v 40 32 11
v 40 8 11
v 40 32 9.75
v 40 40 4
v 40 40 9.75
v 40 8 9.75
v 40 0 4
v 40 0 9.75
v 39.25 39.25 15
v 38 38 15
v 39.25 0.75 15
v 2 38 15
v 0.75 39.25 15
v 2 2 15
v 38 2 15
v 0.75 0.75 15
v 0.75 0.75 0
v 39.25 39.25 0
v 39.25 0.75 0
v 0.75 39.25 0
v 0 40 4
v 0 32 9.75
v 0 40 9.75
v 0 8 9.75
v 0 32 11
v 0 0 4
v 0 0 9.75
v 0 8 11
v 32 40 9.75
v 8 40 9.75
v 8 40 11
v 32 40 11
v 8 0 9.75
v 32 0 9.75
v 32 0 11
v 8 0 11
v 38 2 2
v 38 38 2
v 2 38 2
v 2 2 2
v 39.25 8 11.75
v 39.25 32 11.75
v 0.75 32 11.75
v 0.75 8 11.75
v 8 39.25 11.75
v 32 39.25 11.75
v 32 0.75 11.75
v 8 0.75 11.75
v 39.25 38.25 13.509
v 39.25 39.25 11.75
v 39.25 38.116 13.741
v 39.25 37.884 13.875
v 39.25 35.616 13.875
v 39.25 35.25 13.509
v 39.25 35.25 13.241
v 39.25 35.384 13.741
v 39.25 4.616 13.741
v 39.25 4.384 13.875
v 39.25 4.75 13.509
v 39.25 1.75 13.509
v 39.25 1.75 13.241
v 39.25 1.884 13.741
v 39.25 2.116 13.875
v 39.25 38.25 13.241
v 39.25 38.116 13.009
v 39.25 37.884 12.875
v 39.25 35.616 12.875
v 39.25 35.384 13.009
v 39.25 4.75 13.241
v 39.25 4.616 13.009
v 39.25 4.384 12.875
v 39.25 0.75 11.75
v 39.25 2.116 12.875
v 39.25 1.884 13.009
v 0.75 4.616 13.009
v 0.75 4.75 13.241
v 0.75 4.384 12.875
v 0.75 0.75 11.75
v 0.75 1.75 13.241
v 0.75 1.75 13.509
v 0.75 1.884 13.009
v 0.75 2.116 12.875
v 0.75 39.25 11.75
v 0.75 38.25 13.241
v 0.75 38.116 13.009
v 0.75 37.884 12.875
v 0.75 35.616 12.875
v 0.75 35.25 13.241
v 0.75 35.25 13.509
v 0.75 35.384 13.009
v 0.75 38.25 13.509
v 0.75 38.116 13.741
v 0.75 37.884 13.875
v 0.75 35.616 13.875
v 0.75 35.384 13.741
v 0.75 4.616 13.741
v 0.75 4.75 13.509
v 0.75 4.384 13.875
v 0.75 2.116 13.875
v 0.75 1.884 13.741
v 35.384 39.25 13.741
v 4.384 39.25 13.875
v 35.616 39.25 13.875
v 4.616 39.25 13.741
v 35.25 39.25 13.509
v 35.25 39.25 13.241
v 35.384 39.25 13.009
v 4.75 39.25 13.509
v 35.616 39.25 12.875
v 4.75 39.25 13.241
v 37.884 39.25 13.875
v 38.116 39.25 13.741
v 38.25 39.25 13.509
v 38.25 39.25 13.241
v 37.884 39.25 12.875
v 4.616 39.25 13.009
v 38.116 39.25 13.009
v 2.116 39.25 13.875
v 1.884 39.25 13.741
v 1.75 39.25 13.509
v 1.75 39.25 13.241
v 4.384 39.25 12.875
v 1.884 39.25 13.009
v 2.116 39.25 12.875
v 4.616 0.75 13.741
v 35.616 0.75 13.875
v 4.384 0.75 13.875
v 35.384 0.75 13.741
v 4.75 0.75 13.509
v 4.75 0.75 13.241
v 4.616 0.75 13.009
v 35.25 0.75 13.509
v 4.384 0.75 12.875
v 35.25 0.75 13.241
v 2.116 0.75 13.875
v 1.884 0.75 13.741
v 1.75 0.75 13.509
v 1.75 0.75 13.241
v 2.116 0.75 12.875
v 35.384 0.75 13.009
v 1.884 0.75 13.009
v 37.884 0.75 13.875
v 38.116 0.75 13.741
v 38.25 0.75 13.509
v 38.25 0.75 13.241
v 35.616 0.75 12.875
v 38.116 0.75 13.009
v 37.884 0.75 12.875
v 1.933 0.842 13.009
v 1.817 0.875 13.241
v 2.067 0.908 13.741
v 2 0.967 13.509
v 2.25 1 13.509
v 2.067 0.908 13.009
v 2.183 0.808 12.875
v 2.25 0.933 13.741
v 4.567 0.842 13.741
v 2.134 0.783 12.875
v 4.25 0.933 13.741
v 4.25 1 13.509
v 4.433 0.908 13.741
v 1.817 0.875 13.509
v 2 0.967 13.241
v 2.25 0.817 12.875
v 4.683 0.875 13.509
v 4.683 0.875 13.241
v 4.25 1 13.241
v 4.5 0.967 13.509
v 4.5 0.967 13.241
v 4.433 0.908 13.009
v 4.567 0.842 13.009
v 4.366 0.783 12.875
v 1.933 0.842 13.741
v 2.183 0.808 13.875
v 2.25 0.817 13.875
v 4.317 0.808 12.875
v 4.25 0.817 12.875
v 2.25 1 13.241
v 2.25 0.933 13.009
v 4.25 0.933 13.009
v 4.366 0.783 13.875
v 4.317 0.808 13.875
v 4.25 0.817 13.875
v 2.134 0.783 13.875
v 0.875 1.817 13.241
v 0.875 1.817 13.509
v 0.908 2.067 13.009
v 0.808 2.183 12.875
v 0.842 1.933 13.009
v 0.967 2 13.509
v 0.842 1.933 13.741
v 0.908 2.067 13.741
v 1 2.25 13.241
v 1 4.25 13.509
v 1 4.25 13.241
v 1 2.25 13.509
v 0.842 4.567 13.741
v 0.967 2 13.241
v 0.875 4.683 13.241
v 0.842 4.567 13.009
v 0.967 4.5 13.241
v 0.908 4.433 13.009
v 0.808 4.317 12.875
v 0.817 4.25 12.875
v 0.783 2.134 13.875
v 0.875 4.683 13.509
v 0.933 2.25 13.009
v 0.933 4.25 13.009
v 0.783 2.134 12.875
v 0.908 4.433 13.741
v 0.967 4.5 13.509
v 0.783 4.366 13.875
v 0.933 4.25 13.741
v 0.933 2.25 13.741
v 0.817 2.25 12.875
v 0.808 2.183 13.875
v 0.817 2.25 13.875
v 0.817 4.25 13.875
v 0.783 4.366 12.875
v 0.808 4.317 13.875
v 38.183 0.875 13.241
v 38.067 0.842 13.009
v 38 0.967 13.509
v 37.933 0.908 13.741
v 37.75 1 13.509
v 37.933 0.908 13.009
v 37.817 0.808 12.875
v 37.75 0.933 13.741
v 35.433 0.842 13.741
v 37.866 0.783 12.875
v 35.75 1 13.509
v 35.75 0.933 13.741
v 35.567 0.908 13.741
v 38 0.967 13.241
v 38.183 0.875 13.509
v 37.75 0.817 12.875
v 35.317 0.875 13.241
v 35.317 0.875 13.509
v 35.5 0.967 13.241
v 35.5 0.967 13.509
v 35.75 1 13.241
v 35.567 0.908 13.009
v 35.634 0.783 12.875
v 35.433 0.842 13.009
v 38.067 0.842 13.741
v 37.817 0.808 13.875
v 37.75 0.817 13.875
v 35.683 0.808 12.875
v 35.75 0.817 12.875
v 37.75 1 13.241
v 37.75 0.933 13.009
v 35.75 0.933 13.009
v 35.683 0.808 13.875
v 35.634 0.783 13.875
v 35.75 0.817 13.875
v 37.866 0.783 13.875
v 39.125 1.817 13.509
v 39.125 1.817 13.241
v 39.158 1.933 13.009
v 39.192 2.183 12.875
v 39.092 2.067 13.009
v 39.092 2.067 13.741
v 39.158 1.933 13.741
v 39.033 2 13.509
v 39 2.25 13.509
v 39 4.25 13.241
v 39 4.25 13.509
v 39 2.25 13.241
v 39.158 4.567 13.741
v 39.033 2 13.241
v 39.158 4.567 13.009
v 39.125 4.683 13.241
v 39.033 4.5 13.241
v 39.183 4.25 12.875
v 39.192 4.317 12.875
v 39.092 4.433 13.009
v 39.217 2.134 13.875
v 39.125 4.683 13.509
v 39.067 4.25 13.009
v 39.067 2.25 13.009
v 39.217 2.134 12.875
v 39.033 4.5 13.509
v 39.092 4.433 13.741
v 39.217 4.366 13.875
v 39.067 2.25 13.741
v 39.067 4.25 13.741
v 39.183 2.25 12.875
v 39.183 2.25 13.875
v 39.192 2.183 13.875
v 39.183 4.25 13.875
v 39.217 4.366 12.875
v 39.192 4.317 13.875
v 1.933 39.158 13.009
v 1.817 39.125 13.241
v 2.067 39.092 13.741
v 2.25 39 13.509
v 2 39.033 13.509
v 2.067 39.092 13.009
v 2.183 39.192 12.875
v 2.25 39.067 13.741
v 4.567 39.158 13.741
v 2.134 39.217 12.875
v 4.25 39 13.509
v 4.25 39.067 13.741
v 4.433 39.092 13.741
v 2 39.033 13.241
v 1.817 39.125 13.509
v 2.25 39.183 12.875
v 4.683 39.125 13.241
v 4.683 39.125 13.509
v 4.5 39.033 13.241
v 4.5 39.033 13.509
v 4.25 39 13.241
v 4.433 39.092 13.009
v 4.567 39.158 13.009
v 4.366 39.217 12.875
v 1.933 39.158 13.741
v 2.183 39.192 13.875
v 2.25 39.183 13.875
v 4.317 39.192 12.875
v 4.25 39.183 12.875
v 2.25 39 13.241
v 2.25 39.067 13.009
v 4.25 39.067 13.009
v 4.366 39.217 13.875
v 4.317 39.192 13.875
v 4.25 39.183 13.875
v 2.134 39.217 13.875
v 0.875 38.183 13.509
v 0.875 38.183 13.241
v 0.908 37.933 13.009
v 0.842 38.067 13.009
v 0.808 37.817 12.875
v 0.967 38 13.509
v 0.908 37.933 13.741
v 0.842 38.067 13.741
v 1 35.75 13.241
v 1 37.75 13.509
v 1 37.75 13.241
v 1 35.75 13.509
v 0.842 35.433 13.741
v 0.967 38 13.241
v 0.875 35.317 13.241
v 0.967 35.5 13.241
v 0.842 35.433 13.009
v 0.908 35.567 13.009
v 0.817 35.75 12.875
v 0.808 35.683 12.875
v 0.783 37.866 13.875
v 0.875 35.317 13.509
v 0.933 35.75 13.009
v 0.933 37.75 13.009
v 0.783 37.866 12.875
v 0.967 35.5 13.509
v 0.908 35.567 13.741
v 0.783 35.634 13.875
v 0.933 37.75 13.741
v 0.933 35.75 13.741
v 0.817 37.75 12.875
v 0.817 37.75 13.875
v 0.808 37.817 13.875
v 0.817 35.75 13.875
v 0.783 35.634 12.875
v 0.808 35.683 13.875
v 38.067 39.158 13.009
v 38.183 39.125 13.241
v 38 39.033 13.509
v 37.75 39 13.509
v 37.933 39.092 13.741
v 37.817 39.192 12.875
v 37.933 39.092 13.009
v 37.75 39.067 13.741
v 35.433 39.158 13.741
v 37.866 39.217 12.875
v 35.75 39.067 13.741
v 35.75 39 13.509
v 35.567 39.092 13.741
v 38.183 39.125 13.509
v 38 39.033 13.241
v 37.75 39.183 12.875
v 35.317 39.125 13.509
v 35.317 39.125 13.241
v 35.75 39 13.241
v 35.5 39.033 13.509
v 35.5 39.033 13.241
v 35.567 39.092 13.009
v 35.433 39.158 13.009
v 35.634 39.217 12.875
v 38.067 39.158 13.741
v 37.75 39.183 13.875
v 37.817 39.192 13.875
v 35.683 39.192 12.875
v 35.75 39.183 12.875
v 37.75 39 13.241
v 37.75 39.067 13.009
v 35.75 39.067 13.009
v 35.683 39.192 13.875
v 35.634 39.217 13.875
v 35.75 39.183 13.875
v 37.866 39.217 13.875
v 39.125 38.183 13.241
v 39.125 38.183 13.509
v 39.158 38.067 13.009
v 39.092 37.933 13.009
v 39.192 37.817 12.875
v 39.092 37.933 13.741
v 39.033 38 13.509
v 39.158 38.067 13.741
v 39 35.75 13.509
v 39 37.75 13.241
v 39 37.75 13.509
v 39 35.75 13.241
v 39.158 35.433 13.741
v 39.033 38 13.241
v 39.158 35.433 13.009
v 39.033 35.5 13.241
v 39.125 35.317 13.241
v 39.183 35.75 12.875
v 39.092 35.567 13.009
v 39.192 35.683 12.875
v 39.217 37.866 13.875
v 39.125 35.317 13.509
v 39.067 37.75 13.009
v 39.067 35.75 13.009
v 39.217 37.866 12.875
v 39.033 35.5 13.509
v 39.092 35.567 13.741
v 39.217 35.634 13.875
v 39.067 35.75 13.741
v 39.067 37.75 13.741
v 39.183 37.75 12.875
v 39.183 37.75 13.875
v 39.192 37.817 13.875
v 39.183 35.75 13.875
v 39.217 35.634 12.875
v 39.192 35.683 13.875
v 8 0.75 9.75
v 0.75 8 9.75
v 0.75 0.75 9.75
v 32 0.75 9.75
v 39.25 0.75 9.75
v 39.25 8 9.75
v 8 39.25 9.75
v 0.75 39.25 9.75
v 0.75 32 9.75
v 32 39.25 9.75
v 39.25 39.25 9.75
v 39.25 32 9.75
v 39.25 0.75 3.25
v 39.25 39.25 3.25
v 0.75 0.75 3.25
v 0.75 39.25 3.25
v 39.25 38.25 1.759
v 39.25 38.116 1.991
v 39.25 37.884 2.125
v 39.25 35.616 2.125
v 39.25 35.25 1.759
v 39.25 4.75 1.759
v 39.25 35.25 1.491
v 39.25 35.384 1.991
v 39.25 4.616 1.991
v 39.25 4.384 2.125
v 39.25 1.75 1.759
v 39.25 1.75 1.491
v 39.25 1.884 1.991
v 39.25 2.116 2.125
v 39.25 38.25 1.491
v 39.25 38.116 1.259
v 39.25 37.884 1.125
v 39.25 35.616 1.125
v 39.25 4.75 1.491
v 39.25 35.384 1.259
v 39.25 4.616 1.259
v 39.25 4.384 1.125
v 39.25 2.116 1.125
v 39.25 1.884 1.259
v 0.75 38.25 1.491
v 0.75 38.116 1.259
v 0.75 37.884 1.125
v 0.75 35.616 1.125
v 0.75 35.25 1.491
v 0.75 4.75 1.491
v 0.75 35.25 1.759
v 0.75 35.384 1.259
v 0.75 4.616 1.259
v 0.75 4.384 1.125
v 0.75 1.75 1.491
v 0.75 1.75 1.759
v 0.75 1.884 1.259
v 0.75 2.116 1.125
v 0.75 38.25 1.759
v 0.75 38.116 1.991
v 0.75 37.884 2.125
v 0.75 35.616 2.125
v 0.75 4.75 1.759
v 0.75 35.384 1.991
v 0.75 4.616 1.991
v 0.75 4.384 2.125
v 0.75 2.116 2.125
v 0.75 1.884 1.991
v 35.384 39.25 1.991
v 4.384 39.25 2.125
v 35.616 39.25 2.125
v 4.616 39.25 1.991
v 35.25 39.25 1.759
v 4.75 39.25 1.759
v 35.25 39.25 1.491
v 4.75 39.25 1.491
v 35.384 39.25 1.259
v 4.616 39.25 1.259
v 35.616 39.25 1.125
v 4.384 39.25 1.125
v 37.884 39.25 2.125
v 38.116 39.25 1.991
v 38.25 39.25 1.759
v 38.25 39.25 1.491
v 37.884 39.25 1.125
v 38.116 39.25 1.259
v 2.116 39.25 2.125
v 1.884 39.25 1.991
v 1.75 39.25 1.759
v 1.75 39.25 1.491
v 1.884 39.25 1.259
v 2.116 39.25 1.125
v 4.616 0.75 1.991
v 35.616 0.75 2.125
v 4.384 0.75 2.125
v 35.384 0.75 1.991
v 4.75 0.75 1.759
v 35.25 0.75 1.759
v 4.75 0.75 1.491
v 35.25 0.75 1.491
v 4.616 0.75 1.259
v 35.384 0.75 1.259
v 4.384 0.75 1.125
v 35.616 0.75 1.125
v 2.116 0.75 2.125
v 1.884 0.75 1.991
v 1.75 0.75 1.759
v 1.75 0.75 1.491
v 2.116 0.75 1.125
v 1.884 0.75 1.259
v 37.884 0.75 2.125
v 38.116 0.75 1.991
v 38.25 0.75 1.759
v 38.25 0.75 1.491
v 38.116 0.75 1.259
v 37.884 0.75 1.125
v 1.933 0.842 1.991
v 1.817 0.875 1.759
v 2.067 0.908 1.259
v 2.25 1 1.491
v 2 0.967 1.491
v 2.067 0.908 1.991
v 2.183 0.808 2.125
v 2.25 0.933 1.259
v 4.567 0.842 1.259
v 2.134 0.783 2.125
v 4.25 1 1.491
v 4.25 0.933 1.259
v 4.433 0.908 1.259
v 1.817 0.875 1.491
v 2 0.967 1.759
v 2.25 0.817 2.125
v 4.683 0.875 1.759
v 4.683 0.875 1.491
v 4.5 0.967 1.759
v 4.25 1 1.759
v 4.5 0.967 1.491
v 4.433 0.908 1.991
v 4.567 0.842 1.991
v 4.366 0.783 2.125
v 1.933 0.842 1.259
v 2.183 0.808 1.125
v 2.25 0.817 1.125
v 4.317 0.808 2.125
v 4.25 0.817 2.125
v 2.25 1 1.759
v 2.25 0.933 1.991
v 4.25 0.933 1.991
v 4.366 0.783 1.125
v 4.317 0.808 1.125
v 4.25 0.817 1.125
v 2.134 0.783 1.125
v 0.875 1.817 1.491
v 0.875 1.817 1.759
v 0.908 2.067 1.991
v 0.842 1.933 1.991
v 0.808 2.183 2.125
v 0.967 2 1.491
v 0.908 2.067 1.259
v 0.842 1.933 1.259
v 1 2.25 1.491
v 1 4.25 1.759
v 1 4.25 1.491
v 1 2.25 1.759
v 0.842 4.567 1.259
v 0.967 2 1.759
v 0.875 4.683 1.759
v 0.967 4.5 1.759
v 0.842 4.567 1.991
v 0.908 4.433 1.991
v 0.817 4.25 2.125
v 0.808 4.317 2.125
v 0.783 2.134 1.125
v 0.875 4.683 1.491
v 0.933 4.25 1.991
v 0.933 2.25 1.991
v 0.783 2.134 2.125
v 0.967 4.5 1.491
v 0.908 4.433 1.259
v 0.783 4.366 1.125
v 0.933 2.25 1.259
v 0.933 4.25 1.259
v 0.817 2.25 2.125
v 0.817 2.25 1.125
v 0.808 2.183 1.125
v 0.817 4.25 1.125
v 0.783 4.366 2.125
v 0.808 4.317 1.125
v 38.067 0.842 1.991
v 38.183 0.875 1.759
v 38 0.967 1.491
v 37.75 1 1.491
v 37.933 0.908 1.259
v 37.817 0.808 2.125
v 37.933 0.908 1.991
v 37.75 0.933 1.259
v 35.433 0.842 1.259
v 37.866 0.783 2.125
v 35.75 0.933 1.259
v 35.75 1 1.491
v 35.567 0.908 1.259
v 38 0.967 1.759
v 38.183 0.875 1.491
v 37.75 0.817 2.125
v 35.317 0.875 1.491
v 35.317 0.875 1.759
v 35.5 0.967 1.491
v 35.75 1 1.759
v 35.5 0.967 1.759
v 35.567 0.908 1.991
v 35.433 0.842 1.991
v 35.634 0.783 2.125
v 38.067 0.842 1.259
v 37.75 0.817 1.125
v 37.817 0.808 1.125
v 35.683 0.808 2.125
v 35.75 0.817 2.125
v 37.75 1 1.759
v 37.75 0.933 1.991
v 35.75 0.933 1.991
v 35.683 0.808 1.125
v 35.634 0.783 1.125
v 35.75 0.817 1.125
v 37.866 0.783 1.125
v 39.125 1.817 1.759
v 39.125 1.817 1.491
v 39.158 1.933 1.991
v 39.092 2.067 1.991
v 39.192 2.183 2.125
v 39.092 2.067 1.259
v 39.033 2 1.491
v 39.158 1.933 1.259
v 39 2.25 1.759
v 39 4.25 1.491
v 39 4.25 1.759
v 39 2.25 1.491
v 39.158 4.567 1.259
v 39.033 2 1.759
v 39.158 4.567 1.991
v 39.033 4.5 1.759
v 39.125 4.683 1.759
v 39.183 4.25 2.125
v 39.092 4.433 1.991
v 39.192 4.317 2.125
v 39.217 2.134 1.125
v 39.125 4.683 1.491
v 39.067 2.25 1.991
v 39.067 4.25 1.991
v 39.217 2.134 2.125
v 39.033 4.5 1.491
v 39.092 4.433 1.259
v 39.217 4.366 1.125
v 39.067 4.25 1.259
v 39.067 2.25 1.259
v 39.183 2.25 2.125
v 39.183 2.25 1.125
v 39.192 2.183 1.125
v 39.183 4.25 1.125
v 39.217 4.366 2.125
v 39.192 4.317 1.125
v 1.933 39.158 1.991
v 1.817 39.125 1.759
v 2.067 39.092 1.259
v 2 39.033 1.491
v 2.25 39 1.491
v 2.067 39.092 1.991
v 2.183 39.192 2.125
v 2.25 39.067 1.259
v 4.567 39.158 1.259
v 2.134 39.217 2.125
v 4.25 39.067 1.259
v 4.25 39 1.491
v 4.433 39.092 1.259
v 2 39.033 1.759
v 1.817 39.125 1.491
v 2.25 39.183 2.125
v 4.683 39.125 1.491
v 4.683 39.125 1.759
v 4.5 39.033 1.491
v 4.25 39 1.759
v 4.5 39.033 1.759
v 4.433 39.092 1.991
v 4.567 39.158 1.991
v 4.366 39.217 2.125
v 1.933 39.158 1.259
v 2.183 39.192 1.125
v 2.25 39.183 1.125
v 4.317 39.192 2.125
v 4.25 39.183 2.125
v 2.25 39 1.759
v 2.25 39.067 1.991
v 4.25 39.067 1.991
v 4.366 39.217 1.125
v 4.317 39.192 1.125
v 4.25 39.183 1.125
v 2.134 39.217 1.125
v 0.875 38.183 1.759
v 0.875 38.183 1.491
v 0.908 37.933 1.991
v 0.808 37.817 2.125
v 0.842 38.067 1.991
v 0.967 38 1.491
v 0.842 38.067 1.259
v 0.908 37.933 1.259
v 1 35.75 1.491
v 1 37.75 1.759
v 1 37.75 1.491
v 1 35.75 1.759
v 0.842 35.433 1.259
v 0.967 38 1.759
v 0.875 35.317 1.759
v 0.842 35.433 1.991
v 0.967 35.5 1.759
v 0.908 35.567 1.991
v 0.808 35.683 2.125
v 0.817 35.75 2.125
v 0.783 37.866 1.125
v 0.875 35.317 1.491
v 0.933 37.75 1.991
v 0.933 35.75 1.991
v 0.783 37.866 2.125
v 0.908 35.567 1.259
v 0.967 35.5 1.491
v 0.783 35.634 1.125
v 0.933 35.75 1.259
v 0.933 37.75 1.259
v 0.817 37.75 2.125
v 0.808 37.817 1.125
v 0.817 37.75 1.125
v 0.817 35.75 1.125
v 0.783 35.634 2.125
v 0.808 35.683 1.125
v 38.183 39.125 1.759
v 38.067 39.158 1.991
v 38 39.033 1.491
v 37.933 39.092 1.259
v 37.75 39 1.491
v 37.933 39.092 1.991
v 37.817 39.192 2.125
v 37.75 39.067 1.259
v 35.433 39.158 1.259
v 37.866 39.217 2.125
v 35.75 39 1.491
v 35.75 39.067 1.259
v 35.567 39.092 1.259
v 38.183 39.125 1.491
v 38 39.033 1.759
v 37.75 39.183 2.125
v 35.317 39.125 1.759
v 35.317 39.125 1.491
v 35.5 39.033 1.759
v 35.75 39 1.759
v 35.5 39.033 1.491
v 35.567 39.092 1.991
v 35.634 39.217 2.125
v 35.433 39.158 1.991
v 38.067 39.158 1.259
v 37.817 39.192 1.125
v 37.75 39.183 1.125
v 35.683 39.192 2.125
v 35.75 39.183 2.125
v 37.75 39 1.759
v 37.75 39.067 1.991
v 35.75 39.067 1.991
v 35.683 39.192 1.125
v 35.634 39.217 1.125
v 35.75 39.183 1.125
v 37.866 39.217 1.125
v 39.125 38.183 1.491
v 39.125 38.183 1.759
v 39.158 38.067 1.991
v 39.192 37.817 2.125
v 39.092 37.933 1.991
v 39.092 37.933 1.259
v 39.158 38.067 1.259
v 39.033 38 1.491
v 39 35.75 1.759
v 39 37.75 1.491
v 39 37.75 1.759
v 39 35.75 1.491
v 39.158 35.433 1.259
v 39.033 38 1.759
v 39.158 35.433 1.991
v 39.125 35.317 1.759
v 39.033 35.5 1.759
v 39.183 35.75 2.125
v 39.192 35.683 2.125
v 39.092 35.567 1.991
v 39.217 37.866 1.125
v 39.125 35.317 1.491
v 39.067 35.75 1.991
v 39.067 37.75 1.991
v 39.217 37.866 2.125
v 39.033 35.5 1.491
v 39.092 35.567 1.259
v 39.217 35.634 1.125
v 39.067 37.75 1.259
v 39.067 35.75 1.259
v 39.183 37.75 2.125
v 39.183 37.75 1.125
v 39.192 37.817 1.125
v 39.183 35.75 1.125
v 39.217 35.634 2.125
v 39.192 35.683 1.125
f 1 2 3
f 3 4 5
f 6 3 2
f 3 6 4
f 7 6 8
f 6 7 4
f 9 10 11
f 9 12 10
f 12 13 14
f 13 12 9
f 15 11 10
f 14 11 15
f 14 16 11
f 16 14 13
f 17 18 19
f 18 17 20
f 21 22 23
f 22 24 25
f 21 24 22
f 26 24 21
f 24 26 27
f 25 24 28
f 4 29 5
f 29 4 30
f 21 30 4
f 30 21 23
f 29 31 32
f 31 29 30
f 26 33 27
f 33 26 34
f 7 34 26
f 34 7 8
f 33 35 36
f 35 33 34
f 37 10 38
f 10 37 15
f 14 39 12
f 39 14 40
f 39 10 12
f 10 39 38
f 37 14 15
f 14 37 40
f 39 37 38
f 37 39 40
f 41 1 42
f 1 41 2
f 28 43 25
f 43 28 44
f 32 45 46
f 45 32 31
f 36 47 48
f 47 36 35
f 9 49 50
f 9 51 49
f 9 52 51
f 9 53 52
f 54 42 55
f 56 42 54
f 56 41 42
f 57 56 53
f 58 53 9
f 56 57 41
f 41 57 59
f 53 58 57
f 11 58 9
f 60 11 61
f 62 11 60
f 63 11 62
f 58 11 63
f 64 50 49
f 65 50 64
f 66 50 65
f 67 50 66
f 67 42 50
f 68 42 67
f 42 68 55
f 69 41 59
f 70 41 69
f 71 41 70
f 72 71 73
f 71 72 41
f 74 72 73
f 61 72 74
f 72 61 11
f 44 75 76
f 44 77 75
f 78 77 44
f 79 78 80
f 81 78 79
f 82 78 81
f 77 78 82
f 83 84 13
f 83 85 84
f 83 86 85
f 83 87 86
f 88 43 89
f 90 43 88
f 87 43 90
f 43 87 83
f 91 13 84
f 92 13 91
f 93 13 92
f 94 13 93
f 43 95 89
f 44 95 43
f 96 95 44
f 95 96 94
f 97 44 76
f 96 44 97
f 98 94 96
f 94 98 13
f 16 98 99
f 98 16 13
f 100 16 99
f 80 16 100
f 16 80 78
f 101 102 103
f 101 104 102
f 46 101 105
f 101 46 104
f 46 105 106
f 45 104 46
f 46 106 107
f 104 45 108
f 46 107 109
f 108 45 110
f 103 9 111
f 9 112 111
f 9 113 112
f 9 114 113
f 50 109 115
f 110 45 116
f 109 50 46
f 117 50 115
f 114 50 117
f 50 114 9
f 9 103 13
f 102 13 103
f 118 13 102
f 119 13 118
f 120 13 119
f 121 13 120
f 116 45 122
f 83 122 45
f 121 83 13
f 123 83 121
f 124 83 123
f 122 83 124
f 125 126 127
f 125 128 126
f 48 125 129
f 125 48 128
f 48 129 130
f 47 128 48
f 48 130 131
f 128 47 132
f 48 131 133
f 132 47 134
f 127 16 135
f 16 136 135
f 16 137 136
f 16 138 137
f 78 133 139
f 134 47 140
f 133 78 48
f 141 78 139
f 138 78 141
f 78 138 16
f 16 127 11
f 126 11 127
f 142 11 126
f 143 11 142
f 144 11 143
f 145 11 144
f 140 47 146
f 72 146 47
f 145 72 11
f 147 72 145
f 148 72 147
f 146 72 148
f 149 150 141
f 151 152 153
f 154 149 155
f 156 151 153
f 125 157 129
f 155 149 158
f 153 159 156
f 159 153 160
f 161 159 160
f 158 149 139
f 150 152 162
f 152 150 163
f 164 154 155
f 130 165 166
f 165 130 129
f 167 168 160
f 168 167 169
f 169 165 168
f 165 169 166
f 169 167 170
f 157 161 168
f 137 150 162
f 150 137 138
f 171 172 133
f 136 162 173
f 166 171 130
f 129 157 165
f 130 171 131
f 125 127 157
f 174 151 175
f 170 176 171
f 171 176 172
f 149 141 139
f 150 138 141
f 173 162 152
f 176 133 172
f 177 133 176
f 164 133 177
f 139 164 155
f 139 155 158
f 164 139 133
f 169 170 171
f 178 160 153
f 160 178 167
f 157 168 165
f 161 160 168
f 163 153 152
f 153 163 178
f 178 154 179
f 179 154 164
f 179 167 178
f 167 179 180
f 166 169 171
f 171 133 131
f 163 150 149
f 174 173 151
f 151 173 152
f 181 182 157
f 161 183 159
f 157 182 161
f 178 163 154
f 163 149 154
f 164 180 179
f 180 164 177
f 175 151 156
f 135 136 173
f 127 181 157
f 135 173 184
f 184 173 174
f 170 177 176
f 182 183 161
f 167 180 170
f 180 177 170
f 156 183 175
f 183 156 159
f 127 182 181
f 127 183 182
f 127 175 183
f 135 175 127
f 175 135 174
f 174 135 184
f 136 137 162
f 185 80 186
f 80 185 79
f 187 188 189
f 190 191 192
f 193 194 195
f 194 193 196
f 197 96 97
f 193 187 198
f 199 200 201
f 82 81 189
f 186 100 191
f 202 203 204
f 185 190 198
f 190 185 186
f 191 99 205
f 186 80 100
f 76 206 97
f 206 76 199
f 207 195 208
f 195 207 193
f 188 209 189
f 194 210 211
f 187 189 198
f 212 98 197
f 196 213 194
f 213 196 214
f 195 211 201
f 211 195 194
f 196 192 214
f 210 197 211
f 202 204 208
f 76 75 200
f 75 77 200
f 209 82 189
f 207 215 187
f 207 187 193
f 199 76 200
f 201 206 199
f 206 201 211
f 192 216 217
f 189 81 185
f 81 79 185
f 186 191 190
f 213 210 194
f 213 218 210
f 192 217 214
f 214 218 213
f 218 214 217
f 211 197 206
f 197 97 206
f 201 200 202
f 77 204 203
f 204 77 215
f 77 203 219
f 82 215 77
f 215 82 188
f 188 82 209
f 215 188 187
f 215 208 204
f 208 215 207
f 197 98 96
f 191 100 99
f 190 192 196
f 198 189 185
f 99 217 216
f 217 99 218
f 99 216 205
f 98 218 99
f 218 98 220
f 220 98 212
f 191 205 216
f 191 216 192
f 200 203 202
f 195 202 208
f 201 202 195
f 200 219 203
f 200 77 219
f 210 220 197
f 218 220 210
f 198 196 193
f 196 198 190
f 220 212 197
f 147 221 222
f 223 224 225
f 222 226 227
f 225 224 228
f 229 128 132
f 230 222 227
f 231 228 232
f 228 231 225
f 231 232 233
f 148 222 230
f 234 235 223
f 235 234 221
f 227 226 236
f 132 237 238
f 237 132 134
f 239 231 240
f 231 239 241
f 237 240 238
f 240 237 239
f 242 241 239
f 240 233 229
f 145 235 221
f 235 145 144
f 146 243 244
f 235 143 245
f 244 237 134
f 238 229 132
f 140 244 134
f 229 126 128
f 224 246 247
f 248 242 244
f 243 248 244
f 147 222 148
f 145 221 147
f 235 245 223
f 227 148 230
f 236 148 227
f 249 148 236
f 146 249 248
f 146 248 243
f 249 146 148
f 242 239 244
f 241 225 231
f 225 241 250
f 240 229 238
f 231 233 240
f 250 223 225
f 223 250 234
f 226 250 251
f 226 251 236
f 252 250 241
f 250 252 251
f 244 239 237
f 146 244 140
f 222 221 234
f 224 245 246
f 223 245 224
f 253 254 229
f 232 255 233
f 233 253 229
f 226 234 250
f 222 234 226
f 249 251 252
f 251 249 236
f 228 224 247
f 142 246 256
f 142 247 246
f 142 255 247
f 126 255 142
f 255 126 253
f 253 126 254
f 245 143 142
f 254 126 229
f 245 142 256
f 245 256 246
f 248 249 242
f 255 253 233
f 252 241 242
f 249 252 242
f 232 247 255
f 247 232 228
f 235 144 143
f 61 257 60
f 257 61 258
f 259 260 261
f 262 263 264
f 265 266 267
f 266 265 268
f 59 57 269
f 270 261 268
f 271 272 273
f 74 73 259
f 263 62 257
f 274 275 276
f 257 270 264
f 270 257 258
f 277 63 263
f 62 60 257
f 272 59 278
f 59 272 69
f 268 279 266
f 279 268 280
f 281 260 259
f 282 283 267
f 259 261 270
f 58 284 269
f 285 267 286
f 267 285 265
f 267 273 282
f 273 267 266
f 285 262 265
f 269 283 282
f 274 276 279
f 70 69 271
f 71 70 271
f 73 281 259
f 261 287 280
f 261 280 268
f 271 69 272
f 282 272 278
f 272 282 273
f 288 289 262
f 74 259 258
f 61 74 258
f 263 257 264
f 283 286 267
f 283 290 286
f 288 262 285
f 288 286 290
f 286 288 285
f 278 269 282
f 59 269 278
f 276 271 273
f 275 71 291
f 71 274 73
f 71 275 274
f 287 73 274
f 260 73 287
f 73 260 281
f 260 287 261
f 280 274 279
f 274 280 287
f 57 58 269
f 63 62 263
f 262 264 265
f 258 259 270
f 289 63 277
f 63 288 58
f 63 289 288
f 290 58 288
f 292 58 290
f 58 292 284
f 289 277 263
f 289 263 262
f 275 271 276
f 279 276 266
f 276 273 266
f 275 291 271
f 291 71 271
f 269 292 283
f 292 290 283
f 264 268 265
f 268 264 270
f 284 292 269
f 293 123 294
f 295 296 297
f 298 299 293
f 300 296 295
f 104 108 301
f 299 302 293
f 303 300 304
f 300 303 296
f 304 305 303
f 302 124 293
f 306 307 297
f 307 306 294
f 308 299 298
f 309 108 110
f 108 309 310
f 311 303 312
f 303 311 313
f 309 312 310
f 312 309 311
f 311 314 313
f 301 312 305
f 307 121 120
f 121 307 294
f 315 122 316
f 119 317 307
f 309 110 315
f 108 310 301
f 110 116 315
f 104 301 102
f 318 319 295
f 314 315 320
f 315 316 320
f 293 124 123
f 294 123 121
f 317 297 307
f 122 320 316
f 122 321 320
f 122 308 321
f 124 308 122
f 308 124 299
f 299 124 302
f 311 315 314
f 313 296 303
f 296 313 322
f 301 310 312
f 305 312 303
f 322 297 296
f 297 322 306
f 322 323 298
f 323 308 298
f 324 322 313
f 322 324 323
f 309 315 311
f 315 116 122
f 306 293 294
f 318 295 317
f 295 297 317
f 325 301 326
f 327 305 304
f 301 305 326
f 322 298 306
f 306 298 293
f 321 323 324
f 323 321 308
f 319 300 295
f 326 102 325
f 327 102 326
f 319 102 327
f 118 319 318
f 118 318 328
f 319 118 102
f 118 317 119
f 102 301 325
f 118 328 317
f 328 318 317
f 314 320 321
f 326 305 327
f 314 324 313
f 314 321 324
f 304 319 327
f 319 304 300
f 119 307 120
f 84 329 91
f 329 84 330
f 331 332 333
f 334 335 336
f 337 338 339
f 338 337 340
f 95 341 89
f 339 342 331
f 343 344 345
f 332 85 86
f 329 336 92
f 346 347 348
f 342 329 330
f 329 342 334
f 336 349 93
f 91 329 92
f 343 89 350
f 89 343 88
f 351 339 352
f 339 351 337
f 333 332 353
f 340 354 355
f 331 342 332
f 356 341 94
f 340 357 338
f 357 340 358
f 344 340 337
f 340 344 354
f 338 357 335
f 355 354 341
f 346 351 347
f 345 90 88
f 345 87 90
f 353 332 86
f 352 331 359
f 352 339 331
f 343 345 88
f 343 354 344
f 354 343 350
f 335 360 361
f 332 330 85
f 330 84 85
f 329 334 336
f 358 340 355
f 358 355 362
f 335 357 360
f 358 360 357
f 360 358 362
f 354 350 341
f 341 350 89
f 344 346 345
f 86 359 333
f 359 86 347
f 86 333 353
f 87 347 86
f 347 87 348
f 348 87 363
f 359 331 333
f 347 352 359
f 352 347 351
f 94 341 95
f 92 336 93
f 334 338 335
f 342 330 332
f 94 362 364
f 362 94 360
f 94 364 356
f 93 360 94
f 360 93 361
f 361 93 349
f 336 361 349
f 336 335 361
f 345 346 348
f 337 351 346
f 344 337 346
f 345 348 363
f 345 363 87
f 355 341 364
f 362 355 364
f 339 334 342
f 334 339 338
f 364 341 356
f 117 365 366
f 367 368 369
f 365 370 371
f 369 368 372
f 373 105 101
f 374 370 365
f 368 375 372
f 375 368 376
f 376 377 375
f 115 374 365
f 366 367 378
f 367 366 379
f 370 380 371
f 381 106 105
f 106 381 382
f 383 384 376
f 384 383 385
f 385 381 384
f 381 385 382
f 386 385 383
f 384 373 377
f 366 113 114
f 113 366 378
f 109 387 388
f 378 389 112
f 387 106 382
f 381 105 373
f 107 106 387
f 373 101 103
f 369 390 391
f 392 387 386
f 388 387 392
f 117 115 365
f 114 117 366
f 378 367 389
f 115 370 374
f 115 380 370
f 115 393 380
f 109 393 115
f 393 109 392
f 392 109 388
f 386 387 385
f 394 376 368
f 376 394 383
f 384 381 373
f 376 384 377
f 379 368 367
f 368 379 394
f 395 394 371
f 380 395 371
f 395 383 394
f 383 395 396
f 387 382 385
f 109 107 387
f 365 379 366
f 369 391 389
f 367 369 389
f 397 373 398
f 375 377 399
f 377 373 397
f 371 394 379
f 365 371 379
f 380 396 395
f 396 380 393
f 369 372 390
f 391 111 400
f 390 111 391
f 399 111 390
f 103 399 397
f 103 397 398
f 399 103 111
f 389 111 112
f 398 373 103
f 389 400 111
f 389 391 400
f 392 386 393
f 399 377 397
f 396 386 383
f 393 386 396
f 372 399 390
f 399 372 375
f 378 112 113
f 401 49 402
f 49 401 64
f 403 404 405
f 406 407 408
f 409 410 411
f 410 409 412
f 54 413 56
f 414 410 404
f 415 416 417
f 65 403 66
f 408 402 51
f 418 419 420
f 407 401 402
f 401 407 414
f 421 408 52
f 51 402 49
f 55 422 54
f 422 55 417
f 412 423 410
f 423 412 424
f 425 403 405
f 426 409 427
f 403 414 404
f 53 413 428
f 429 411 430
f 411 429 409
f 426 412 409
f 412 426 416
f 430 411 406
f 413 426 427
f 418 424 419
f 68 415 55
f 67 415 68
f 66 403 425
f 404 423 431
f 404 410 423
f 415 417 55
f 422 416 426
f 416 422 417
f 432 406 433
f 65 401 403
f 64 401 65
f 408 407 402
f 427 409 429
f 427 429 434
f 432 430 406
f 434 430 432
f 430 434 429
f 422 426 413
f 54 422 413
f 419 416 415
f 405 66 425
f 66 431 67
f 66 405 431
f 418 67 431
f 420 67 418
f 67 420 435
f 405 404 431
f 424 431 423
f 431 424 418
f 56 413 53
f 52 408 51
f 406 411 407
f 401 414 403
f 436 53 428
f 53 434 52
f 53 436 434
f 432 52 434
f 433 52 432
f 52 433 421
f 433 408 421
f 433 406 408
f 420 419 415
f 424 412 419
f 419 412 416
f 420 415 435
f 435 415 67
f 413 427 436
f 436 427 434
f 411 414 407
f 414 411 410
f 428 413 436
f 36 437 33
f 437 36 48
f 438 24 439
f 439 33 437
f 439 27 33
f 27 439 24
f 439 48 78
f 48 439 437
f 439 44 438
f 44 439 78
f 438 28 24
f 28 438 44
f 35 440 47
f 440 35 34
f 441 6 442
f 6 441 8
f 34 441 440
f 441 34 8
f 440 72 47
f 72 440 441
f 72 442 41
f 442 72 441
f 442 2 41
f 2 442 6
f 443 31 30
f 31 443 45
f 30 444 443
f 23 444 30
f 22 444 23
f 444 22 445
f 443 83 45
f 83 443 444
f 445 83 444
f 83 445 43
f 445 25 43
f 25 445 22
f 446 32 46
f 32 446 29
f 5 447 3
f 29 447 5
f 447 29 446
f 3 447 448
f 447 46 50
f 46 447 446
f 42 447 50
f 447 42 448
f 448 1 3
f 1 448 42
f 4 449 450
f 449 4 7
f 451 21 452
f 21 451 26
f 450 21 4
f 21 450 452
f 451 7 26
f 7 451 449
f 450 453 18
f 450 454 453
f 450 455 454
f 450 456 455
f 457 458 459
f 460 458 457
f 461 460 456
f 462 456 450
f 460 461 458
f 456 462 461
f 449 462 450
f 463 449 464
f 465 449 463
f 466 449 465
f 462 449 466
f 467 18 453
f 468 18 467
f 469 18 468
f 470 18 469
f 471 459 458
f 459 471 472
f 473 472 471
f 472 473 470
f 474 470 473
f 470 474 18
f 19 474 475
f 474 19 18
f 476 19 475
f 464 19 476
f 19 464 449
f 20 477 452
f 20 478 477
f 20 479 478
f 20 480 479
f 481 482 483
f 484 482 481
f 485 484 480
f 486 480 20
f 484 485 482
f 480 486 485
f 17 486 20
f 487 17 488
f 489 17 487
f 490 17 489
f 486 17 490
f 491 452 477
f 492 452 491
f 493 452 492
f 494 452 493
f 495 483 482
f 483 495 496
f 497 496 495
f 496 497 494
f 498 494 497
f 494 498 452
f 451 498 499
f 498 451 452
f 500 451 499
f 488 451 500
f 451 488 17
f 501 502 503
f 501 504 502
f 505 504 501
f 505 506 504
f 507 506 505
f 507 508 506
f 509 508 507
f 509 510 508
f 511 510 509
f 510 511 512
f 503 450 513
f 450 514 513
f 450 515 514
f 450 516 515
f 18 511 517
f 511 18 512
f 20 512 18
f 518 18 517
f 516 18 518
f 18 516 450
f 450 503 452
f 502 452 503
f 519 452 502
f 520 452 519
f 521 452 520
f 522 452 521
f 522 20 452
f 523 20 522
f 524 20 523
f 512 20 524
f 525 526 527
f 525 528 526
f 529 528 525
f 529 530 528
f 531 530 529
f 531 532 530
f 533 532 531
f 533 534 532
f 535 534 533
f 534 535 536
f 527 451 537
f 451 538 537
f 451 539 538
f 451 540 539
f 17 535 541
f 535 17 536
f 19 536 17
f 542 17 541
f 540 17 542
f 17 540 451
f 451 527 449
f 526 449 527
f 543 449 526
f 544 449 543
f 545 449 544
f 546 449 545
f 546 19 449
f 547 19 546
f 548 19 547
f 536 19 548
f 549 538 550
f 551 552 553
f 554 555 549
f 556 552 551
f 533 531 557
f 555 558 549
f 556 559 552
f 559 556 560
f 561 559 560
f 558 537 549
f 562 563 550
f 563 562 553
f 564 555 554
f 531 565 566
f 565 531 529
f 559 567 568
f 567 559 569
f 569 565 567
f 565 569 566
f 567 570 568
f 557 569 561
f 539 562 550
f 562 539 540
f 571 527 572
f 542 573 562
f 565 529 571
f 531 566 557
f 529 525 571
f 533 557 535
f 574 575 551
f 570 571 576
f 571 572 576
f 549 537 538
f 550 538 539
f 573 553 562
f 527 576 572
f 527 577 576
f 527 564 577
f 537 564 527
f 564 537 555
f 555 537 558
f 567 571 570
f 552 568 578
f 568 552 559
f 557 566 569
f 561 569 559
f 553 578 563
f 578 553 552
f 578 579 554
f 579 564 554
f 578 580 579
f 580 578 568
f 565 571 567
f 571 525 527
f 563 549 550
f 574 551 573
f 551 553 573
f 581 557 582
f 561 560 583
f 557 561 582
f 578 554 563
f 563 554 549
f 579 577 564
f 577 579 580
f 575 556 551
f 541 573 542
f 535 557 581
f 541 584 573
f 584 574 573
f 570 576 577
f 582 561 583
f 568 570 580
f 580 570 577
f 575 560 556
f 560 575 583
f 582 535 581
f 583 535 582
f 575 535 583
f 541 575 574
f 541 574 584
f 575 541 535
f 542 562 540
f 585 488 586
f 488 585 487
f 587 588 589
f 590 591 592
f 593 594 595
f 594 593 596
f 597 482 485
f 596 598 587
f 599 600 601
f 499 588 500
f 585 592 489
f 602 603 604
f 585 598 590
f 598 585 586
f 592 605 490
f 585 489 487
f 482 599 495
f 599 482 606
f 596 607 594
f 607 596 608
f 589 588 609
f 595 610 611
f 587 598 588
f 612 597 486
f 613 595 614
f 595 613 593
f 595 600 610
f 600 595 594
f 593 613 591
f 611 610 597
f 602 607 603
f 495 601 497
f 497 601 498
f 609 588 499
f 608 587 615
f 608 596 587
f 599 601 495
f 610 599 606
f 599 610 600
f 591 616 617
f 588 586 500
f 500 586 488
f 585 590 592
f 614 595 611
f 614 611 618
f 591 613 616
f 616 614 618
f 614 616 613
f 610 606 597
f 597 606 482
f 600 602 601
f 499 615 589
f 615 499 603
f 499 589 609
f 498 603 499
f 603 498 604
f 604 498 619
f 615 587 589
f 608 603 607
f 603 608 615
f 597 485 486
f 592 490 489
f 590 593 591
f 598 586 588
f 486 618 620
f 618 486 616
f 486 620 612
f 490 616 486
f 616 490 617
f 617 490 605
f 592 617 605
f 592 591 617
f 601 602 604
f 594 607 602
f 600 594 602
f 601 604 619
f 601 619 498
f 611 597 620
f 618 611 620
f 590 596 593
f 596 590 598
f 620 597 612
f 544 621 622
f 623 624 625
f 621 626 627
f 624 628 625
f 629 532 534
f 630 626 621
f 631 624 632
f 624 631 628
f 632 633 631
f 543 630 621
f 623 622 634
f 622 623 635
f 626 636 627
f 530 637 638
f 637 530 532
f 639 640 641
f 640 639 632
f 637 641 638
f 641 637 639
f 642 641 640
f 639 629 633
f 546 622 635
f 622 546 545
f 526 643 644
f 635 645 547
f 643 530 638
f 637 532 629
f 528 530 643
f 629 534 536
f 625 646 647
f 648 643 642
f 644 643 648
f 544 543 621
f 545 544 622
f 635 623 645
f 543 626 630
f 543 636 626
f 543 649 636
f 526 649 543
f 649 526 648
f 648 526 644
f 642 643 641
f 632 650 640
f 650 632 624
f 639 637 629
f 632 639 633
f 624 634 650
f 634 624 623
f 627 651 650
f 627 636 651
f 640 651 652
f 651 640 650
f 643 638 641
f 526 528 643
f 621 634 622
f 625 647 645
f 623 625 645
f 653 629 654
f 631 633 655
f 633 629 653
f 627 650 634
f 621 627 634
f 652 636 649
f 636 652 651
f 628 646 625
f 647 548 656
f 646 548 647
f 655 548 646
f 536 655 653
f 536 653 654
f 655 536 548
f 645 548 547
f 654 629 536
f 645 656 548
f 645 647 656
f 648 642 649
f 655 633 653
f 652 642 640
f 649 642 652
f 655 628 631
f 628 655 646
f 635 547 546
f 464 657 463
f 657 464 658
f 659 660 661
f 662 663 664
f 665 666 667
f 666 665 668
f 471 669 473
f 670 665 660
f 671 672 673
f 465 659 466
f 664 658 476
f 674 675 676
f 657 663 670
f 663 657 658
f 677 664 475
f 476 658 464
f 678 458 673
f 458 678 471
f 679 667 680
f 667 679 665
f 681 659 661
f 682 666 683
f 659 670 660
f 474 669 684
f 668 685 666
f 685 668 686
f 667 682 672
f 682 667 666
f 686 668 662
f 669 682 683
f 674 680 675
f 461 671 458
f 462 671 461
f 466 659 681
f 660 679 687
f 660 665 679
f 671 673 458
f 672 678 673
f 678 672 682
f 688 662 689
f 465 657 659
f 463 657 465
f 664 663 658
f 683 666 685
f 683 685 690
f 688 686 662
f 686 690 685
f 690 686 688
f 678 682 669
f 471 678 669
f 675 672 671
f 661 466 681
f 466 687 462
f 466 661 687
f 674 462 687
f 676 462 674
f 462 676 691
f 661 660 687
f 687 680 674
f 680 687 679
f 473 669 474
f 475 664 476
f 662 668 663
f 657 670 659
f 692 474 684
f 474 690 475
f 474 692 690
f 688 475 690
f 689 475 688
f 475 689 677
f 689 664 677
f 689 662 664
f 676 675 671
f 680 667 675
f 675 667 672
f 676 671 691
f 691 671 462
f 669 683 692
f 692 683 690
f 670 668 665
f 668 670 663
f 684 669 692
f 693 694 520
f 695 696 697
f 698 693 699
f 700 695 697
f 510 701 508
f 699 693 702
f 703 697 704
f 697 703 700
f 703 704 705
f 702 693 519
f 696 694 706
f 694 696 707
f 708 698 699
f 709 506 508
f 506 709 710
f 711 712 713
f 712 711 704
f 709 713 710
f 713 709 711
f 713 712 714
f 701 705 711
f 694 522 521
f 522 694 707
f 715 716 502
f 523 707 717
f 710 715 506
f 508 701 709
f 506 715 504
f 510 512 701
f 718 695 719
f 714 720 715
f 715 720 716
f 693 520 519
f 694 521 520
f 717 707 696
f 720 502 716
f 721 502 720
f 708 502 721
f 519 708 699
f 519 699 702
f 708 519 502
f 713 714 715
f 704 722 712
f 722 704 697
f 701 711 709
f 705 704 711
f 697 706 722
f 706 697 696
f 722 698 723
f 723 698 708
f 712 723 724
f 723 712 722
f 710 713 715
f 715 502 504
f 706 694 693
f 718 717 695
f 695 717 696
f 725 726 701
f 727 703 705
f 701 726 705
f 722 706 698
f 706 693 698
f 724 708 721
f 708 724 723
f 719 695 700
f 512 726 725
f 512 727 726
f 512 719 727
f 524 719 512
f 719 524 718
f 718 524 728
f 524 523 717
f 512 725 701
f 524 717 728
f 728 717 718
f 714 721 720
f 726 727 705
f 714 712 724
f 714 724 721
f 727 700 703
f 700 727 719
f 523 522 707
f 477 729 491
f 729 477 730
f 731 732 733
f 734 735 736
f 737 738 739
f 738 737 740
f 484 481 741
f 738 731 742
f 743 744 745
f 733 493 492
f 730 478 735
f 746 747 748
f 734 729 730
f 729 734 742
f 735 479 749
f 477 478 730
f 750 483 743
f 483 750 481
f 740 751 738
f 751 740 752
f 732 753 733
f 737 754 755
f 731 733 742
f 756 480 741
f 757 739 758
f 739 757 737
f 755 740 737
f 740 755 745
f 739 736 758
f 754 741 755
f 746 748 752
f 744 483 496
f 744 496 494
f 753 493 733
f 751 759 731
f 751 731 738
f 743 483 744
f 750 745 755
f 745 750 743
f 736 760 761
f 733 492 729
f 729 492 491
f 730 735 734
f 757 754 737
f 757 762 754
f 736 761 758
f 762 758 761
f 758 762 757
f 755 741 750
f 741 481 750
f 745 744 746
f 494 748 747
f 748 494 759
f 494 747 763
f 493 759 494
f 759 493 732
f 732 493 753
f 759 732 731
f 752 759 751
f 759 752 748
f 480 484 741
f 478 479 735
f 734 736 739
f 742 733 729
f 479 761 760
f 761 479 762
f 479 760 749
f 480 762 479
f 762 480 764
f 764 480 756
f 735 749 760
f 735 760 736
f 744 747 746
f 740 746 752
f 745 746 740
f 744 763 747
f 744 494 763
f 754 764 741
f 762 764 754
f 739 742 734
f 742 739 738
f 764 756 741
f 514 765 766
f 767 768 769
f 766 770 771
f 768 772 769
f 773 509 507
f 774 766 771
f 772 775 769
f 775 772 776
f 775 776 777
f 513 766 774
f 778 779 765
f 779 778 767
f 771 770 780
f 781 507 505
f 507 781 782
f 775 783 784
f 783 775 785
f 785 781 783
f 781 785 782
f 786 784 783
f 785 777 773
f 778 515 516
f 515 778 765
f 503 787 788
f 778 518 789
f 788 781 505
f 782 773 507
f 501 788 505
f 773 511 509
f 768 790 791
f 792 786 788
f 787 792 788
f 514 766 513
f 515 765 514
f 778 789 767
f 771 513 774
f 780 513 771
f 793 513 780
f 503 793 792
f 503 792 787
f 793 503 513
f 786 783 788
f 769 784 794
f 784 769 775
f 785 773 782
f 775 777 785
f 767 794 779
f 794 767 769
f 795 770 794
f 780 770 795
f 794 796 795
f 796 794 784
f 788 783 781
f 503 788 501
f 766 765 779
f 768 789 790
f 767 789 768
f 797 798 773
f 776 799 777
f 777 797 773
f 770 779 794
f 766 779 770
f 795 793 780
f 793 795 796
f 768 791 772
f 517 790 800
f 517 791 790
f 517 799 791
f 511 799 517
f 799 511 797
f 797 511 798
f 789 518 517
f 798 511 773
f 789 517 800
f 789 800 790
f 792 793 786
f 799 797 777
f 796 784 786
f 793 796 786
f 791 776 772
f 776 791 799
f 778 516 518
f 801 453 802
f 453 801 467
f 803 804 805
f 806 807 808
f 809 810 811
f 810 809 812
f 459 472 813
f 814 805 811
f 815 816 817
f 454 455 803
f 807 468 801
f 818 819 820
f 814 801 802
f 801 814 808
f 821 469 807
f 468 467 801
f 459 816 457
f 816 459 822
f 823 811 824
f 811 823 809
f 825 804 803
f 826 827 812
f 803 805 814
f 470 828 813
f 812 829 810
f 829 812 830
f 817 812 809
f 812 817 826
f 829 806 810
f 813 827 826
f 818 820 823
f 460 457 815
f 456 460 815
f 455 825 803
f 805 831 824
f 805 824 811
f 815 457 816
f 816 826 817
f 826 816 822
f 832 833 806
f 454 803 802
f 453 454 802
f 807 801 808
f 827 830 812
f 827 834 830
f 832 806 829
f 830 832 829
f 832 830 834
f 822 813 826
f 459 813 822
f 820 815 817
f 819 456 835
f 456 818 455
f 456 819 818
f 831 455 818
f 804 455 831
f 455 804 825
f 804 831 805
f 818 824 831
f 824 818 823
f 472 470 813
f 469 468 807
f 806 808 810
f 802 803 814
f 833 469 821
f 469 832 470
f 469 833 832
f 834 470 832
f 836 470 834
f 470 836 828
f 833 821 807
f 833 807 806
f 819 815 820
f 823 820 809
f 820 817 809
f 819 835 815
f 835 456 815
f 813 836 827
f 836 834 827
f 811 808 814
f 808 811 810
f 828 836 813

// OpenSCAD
// Test: ENABLED_B flag — one enabled, one disabled, should only render the enabled one
include <../boardgame_insert_toolkit_lib.3.scad>;

g_b_print_lid = false;
g_b_print_box = true;
g_isolated_print_box = "";

data = [
    [ "enabled box",
        [
            [ ENABLED_B, t ],
            [ BOX_SIZE_XYZ, [40, 40, 15] ],
            [ BOX_COMPONENT,
                [
                    [ CMP_COMPARTMENT_SIZE_XYZ, [36, 36, 13] ],
                ]
            ]
        ]
    ],
    [ "disabled box",
        [
            [ ENABLED_B, f ],
            [ BOX_SIZE_XYZ, [40, 40, 15] ],
            [ BOX_COMPONENT,
                [
                    [ CMP_COMPARTMENT_SIZE_XYZ, [36, 36, 13] ],
                ]
            ]
        ]
    ],
];

MakeAll();
